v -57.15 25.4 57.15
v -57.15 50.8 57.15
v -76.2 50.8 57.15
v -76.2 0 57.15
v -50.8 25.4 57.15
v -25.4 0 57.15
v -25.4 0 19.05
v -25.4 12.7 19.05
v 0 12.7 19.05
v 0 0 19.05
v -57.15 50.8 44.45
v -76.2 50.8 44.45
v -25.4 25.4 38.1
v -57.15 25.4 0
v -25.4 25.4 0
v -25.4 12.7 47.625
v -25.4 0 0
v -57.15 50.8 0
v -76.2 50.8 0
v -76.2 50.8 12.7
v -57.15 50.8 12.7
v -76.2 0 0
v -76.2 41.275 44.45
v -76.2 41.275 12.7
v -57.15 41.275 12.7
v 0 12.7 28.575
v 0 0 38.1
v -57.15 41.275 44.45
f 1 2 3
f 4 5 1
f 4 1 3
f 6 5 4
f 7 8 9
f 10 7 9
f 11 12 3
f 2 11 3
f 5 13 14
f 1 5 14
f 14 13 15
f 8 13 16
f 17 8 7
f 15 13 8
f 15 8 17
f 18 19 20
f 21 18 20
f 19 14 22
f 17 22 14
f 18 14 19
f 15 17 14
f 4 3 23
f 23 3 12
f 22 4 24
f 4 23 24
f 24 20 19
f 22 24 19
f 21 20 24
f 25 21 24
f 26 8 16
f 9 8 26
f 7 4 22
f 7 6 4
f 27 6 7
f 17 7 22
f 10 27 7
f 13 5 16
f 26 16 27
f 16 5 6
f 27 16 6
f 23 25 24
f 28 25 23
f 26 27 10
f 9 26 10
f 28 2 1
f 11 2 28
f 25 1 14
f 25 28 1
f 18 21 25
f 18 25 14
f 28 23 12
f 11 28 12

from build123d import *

# Parameters (mm, degrees)
SKETCH1_W           = 57.15
SKETCH1_H           = 25.4
BOSS_EXTRUDE1_DEPTH = 57.15
SKETCH2_W           = 25.4
SKETCH2_H           = 19.05
CUT_EXTRUDE1_DEPTH  = 85.719566807
CUT_EXTRUDE3_DEPTH  = 142.865944679
BOSS_EXTRUDE2_DEPTH = 19.05
SKETCH8_W           = 25.4
SKETCH8_H           = 76.2
CUT_EXTRUDE4_DEPTH  = 12.7


with BuildPart() as part:
    # Sketch1 → Boss-Extrude1 (new body)
    with BuildSketch(Plane(origin=(0, 0, 0), x_dir=(0, 0, -1), z_dir=(1, 0, 0))):
        with Locations((-28.575, 12.7)):
            Rectangle(SKETCH1_W, SKETCH1_H)
    extrude(amount=-BOSS_EXTRUDE1_DEPTH)

    # Sketch2 → Cut-Extrude1 (cut, through all)
    with BuildSketch(Plane(origin=(0, 25.4, 0), x_dir=(1, 0, 0), z_dir=(0, 1, 0))):
        with Locations((-12.7, -9.525)):
            Rectangle(SKETCH2_W, SKETCH2_H)
    extrude(amount=-CUT_EXTRUDE1_DEPTH, mode=Mode.SUBTRACT)

    # Sketch4 → Cut-Extrude3 (cut, through all, along a direction that is not the sketch's normal)
    with BuildSketch(Plane.XY.offset(57.15)):
        Polygon((-50.8, 25.4), (-25.4, 0), (0, 0), (0, 25.4), align=None)
    extrude(amount=-CUT_EXTRUDE3_DEPTH, dir=(-0.8, 0, 0.6), mode=Mode.SUBTRACT)

    # Sketch6 → Boss-Extrude2 (add)
    with BuildSketch(Plane.ZY.offset(57.15)):
        Polygon((0, 0), (0, 50.8), (12.7, 50.8), (12.7, 41.275), (44.45, 41.275), (44.45, 50.8), (57.15, 50.8), (57.15, 0), align=None)
    extrude(amount=BOSS_EXTRUDE2_DEPTH)

    # Sketch8 → Cut-Extrude4 (cut)
    with BuildSketch(Plane(origin=(0, 25.4, 0), x_dir=(1, 0, 0), z_dir=(0, 1, 0))):
        with Locations((-12.7, -57.15)):
            Rectangle(SKETCH8_W, SKETCH8_H)
    extrude(amount=-CUT_EXTRUDE4_DEPTH, mode=Mode.SUBTRACT)


solid = part.part
